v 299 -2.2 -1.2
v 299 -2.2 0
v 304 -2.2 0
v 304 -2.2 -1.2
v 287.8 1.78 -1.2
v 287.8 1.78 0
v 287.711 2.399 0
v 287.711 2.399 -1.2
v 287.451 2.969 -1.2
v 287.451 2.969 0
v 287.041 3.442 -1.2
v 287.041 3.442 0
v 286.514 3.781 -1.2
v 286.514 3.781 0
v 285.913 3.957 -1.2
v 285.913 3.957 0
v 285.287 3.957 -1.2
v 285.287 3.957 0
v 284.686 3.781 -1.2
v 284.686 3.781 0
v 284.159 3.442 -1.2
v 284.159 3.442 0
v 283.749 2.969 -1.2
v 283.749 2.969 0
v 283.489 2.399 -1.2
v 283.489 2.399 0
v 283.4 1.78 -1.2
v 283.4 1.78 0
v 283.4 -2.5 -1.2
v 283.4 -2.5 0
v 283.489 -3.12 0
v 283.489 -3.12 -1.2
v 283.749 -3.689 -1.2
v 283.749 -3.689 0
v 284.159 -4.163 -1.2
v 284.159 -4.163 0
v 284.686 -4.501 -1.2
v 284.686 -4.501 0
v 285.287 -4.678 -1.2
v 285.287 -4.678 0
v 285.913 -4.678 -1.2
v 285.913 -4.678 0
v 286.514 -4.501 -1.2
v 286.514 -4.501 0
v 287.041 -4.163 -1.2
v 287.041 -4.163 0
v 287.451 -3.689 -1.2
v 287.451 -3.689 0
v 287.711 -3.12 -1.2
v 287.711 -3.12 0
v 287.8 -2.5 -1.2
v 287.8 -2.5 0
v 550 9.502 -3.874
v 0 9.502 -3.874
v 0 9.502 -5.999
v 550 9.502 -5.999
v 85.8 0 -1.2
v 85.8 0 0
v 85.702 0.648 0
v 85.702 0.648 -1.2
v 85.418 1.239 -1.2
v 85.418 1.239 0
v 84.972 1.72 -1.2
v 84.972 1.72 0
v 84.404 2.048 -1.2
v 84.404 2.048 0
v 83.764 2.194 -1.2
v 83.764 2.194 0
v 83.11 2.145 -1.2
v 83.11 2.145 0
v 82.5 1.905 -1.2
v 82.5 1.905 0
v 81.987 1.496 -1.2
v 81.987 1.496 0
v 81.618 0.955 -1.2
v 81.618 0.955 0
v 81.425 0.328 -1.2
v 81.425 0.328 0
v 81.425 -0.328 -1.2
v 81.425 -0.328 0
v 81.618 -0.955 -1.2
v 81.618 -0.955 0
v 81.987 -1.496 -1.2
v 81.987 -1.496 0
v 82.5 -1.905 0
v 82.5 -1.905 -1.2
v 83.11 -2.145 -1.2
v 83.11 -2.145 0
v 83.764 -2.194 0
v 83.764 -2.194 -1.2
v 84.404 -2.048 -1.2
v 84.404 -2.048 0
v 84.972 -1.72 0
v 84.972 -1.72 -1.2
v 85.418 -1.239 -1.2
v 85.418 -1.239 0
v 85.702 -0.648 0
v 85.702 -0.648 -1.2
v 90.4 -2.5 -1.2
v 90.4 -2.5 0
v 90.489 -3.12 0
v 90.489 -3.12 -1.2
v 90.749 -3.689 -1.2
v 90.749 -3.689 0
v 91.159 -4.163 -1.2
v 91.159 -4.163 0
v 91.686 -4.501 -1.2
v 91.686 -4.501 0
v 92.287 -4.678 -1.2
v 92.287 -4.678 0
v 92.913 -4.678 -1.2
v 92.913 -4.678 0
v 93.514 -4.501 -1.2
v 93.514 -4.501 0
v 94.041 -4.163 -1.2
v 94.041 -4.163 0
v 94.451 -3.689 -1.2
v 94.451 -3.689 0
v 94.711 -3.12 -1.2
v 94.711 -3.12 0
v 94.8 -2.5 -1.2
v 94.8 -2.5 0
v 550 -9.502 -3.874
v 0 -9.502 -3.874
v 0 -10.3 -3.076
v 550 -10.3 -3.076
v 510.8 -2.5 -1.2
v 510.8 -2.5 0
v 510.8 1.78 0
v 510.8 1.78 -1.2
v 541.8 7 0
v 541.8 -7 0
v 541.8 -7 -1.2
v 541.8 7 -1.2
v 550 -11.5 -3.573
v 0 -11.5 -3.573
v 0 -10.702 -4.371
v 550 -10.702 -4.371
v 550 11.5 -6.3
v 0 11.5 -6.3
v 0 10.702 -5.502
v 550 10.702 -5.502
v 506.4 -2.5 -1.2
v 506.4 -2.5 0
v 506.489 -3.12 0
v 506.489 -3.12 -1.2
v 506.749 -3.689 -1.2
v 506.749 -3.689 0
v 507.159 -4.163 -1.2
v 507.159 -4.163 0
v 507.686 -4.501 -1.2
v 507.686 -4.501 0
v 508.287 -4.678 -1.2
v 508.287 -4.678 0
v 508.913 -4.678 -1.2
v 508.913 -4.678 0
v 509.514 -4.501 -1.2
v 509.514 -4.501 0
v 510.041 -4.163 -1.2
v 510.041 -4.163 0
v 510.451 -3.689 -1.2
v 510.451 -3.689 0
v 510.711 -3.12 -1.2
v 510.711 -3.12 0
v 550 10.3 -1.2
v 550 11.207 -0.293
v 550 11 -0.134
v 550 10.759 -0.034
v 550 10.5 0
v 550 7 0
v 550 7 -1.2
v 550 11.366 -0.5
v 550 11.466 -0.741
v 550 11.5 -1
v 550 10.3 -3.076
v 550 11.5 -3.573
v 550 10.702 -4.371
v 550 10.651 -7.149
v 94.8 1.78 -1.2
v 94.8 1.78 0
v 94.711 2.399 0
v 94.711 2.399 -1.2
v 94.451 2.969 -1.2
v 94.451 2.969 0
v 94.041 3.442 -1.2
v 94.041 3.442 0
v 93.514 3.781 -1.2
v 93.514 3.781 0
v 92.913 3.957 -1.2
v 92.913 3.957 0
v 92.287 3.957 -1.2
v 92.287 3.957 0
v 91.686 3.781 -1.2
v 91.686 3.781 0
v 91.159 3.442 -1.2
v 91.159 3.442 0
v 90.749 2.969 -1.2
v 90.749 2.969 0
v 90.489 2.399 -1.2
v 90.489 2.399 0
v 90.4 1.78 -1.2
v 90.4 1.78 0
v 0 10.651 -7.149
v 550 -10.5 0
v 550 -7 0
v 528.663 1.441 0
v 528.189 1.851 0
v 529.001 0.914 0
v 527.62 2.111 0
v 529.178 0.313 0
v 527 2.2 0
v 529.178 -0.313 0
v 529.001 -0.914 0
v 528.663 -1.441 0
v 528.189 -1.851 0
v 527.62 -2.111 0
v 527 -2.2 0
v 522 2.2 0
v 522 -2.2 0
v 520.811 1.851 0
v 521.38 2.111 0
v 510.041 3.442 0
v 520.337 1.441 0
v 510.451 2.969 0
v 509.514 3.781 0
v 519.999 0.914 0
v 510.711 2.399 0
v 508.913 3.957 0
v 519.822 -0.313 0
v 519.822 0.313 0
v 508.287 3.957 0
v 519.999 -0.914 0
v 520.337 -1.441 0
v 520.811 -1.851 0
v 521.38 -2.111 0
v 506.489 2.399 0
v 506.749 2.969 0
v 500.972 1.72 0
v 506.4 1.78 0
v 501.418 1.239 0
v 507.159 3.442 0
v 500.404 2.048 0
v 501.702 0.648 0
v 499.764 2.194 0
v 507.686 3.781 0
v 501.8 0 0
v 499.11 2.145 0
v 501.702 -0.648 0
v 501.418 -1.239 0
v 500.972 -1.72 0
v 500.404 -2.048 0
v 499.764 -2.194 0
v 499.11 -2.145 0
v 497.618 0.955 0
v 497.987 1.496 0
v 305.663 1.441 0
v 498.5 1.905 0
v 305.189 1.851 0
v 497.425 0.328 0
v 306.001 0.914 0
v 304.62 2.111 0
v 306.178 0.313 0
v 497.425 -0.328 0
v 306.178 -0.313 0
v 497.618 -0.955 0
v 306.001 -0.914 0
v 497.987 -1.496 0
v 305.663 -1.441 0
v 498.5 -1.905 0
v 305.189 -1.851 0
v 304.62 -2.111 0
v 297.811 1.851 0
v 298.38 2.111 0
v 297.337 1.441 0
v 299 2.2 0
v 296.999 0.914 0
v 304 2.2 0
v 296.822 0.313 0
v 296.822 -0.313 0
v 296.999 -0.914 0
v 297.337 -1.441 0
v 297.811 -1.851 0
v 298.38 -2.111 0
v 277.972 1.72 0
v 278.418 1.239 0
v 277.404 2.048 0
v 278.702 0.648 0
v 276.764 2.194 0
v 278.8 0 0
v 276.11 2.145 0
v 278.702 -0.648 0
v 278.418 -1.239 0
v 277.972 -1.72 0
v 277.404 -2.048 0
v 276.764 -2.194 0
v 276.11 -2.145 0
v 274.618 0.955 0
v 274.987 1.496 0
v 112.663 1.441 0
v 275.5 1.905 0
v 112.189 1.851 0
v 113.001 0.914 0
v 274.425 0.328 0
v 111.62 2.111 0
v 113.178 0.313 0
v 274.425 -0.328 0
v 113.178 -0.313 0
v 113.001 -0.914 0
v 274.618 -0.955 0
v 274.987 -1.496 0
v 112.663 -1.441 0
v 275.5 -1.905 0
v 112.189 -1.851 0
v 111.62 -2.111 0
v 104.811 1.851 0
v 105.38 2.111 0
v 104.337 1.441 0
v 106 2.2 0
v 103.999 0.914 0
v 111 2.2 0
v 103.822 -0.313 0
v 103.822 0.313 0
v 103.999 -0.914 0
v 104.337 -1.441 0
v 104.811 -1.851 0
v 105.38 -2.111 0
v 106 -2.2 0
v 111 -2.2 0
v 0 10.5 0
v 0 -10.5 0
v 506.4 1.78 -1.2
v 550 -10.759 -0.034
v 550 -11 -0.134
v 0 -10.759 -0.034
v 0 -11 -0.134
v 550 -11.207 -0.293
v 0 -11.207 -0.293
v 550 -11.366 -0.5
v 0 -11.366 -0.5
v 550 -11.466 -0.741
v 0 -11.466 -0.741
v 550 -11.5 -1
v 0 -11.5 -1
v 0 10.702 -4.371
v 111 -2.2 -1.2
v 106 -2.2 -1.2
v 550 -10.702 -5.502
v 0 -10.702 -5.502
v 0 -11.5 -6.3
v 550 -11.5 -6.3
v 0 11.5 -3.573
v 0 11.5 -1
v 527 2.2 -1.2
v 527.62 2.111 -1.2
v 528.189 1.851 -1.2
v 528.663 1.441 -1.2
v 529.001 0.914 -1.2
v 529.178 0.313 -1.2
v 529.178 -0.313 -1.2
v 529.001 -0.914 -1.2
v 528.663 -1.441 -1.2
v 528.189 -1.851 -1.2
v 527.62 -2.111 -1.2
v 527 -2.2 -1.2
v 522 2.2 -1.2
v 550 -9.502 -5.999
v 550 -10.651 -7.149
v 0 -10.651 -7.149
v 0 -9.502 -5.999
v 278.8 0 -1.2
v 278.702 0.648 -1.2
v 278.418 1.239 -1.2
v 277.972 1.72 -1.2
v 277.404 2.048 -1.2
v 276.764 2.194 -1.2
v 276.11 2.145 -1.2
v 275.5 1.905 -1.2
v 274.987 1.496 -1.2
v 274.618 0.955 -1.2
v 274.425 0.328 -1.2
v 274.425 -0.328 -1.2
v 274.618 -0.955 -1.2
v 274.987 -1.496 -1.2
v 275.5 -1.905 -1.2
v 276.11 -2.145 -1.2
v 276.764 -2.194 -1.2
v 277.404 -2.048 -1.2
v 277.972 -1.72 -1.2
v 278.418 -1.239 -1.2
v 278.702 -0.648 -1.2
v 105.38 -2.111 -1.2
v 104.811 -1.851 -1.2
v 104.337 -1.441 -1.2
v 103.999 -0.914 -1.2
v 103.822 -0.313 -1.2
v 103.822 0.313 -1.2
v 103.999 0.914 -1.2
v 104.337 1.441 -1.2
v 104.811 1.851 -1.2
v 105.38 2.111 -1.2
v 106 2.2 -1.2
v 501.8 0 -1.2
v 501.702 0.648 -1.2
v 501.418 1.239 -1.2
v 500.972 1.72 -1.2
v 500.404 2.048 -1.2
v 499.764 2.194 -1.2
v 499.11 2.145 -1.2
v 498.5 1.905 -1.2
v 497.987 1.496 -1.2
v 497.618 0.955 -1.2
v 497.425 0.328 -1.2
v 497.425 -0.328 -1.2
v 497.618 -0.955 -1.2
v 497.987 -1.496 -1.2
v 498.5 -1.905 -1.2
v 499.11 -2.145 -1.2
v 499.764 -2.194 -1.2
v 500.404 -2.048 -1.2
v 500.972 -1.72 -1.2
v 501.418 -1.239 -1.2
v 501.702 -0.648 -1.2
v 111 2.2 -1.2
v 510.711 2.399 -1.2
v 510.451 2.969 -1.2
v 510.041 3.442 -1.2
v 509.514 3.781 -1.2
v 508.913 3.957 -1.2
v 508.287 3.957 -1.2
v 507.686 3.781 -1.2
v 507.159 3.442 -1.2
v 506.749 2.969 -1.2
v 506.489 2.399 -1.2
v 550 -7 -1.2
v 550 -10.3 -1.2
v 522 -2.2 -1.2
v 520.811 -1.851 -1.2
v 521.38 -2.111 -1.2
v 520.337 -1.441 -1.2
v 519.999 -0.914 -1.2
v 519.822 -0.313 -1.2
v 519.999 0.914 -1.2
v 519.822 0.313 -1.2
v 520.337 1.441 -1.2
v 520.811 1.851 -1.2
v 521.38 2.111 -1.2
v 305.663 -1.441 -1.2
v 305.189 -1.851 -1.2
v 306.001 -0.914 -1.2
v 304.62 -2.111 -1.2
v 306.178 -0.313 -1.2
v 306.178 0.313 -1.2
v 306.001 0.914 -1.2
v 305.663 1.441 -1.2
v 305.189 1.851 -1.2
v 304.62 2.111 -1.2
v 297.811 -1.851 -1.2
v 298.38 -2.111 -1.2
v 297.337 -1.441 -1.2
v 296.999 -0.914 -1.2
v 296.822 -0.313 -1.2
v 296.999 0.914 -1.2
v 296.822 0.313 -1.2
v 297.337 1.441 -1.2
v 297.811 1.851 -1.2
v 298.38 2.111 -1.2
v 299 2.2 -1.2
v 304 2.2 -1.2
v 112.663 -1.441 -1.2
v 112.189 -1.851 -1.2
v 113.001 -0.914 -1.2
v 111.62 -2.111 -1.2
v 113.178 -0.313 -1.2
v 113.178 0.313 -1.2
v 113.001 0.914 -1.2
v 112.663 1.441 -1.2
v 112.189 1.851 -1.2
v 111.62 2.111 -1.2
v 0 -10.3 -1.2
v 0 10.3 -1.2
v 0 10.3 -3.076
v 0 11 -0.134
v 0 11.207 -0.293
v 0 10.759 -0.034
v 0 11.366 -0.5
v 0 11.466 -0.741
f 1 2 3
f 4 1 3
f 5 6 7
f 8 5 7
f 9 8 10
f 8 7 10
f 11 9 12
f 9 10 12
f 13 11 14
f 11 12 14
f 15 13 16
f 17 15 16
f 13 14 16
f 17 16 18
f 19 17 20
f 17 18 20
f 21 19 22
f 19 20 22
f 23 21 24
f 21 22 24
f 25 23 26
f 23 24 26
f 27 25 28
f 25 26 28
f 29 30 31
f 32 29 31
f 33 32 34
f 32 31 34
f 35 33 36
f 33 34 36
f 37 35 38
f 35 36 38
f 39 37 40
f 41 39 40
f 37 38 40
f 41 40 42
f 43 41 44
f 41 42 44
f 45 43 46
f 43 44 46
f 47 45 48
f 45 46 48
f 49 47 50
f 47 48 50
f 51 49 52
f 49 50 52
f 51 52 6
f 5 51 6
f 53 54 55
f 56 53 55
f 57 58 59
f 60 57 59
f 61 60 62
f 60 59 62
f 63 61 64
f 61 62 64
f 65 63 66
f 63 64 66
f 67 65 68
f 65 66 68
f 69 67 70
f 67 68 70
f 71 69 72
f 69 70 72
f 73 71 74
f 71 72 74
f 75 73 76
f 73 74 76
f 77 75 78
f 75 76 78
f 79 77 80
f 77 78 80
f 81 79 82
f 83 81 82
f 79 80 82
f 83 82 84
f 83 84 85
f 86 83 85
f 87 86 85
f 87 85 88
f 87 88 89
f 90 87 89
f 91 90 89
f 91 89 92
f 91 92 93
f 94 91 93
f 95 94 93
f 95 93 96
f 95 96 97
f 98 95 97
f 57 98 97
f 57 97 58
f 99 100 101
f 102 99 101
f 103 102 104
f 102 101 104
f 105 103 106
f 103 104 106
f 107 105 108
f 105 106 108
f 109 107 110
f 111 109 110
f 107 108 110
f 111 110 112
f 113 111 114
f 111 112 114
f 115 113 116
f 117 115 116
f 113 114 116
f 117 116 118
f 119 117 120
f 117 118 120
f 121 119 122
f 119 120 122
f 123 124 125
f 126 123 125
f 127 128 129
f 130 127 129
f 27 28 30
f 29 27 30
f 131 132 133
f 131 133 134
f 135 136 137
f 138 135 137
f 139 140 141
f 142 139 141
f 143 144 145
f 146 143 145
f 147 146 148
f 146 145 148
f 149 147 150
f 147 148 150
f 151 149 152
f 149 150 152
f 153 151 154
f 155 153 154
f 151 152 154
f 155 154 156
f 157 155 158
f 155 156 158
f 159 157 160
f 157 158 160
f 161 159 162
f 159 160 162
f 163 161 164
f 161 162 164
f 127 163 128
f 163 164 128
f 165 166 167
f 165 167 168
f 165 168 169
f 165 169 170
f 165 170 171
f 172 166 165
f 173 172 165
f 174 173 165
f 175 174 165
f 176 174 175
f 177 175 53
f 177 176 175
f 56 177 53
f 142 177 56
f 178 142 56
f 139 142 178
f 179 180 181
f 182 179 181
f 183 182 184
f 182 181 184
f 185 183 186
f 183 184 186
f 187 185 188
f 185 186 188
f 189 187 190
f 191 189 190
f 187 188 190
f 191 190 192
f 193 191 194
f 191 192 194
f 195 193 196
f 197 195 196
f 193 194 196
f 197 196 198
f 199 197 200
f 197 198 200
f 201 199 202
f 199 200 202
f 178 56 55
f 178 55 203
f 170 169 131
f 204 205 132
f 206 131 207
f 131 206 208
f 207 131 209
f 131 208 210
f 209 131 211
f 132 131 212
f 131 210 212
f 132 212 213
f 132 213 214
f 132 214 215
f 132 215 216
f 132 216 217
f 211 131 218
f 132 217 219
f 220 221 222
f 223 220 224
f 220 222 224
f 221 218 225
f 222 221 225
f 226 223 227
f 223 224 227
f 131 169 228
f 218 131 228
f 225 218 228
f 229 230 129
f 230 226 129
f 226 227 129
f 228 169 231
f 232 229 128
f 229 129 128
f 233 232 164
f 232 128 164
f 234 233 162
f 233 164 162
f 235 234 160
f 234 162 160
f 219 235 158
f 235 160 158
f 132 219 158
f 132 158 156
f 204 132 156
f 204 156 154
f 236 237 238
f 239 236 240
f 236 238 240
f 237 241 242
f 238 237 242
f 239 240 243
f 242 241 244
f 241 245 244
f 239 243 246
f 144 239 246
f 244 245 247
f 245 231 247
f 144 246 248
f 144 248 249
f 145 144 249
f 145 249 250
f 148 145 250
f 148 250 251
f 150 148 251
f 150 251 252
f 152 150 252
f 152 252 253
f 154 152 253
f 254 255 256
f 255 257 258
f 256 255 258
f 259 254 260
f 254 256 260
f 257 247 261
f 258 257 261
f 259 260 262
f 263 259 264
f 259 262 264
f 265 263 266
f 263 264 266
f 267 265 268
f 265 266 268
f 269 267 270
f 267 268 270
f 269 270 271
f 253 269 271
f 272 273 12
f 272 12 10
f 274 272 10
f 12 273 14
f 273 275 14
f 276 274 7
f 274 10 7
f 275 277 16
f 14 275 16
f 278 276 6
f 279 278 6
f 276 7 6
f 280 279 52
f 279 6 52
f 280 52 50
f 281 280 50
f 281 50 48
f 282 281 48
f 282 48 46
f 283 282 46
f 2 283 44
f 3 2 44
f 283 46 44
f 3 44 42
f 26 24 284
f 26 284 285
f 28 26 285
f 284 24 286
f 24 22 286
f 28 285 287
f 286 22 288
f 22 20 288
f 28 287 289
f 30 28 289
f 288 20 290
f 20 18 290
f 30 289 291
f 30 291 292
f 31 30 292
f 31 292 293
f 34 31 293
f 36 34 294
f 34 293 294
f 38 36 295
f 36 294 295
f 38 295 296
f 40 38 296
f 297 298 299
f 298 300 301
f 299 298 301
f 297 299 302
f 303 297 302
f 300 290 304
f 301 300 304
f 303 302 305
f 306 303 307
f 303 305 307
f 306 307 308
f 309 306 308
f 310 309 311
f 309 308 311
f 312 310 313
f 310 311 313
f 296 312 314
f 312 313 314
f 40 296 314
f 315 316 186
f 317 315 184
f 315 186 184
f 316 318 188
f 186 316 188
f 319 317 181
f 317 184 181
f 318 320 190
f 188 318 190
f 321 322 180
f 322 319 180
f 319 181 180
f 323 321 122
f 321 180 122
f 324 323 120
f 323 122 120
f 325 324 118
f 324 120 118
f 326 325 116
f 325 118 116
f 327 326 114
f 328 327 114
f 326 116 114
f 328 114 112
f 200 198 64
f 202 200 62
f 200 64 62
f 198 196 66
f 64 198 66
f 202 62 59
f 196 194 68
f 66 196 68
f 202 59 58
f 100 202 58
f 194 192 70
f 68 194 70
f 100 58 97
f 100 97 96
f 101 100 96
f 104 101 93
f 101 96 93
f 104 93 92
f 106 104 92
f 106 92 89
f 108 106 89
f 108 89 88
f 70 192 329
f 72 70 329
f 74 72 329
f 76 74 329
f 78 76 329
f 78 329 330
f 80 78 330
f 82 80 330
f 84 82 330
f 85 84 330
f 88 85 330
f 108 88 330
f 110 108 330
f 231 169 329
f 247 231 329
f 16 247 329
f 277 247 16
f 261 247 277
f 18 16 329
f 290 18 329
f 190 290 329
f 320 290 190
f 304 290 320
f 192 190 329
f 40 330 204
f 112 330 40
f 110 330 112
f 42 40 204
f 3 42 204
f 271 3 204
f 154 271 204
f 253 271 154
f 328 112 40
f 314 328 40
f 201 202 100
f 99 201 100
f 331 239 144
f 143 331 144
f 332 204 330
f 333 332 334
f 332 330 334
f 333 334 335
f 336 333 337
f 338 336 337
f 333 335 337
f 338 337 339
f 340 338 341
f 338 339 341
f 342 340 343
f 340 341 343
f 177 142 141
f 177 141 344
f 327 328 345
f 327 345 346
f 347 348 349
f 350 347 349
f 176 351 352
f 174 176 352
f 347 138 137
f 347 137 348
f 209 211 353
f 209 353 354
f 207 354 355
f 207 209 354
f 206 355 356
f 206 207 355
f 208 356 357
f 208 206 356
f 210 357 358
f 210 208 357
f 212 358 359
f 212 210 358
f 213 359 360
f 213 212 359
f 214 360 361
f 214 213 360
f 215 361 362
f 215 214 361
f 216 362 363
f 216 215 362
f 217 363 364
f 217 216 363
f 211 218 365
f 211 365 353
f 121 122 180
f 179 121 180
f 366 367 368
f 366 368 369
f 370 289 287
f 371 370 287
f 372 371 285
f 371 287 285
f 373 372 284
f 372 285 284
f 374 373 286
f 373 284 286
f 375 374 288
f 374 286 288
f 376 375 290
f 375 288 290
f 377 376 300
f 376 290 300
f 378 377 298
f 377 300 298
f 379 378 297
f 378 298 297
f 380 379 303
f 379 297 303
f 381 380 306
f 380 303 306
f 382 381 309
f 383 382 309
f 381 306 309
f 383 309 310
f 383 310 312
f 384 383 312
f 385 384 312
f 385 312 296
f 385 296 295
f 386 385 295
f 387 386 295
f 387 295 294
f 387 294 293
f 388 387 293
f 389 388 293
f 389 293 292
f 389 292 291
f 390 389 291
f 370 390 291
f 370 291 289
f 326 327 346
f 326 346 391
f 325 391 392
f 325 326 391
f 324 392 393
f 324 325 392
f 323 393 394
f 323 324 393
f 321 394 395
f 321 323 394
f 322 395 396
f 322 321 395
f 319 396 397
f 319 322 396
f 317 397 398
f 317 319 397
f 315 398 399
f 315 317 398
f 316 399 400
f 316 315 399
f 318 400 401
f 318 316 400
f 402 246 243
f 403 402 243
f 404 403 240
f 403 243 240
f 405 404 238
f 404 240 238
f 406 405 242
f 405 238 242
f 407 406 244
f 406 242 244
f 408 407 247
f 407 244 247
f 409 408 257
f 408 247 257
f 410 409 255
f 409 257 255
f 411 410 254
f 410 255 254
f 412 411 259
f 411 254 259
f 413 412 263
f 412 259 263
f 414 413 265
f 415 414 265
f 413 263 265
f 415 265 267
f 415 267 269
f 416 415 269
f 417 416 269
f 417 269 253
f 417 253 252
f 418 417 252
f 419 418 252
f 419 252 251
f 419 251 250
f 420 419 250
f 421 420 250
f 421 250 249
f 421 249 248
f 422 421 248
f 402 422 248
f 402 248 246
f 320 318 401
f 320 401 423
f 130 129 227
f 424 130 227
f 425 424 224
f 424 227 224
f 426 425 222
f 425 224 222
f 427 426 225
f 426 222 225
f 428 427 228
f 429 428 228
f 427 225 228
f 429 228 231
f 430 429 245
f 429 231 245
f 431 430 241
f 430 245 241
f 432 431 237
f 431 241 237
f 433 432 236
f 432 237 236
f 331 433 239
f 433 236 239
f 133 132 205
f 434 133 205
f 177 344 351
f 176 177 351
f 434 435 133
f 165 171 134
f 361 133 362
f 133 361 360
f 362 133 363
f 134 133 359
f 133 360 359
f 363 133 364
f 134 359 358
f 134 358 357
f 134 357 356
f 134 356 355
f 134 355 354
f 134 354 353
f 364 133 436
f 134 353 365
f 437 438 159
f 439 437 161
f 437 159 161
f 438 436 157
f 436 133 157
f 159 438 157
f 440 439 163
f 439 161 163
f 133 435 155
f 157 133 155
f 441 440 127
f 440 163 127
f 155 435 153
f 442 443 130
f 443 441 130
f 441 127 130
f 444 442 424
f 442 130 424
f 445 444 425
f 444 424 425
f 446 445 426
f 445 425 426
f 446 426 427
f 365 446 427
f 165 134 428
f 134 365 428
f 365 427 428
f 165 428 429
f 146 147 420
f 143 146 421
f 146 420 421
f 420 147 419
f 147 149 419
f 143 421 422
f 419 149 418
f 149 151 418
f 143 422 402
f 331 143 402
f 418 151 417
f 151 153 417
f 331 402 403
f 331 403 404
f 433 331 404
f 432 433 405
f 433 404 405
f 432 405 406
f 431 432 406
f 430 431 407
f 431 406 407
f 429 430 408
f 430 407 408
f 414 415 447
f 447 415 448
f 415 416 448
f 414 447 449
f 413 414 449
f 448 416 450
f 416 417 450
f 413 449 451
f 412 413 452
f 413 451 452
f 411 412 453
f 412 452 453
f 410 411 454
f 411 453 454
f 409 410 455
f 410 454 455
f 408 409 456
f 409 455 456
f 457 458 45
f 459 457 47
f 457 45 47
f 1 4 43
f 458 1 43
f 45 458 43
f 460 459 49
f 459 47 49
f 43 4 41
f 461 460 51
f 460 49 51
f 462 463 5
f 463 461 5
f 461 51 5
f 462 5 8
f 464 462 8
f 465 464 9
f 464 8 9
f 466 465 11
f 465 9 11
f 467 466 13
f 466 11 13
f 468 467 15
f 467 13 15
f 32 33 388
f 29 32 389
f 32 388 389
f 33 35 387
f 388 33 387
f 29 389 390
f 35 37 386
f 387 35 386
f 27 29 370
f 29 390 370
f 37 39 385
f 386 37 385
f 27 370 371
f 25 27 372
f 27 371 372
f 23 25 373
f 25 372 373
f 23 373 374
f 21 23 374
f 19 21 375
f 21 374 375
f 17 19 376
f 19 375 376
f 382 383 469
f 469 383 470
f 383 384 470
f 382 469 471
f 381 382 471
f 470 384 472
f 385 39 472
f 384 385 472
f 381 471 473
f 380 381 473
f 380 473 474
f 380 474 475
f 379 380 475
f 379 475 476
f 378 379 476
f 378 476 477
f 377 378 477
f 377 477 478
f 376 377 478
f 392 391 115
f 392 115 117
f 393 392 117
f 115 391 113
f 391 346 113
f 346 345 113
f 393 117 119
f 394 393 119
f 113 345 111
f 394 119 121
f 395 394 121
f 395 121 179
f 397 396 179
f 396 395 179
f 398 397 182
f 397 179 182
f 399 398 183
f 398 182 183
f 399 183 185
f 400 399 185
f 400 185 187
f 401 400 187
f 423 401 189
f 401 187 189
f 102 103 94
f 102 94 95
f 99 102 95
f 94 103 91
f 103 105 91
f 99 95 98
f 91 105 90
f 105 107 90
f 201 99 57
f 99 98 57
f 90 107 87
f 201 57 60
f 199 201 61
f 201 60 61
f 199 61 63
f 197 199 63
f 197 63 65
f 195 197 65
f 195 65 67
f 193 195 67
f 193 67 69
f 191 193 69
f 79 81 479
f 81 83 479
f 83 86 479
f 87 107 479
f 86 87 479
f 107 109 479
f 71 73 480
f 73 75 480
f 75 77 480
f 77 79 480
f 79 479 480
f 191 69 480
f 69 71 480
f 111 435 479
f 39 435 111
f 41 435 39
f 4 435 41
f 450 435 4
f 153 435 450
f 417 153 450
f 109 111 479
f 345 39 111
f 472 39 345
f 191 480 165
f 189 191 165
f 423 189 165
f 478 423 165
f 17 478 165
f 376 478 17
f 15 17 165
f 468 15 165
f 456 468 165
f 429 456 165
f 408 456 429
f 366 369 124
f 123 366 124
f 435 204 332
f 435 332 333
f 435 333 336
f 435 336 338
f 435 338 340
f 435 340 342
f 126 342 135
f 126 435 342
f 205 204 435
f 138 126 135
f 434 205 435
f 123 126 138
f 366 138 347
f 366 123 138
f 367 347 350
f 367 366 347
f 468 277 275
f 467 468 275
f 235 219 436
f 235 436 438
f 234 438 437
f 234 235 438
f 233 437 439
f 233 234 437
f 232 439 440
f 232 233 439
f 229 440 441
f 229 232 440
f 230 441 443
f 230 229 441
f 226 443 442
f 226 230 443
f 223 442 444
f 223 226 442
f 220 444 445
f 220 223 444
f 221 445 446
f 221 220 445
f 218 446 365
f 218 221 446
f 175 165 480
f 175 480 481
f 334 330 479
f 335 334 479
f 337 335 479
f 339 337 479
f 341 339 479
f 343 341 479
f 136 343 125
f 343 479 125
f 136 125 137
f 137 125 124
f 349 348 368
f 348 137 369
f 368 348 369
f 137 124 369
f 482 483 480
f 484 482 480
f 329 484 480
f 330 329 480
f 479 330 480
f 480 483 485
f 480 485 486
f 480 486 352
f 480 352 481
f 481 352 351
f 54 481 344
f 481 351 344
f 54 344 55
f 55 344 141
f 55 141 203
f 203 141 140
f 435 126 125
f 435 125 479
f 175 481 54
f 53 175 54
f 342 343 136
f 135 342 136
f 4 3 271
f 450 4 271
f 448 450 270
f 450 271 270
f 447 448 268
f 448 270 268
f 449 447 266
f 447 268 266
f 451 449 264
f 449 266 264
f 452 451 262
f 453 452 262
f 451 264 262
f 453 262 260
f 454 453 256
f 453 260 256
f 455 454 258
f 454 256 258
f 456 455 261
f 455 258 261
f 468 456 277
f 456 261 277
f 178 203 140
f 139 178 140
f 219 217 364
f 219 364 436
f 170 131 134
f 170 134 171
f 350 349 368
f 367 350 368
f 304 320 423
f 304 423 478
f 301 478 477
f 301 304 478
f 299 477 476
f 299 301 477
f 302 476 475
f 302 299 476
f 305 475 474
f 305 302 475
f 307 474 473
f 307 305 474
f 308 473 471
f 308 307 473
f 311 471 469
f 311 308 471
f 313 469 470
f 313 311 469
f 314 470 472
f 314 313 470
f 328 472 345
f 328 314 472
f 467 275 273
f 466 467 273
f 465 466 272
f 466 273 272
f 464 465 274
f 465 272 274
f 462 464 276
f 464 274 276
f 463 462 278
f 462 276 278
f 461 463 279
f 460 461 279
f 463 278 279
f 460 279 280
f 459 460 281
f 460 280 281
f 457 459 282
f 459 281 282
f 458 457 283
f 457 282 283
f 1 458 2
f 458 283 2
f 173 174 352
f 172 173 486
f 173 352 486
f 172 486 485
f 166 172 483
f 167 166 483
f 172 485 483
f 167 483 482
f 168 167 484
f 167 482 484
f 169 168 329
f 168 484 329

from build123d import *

# Parameters (mm, degrees)
EXTRUDE_3_DEPTH     = 550
SKETCH_2_R          = 2.2
SKETCH_2_W          = 8.2
SKETCH_2_H          = 14
CUT_EXTRUDE_1_DEPTH = 8.148528137


with BuildPart() as part:
    # Эскиз1 → Вытянуть-Тонкостенный3 (new body)
    with BuildSketch(Plane(origin=(0, 0, 0), x_dir=(0, 0, -1), z_dir=(1, 0, 0))):
        with BuildLine():
            Line((6.3, 11.5), (5.501920783, 10.701920783))
            Line((5.501920783, 10.701920783), (4.371381229, 10.701920783))
            Line((4.371381229, 10.701920783), (3.573302011, 11.5))
            Line((3.573302011, 11.5), (1, 11.5))
            ThreePointArc((1, 11.5), (0.292893219, 11.207106781), (0, 10.5))
            Line((0, 10.5), (0, -10.5))
            ThreePointArc((0, -10.5), (0.292893219, -11.207106781), (1, -11.5))
            Line((1, -11.5), (3.573302011, -11.5))
            Line((3.573302011, -11.5), (4.371381229, -10.701920783))
            Line((4.371381229, -10.701920783), (5.501920783, -10.701920783))
            Line((5.501920783, -10.701920783), (6.3, -11.5))
            Line((6.3, -11.5), (7.148528137, -10.651471863))
            Line((7.148528137, -10.651471863), (5.998977057, -9.501920783))
            Line((5.998977057, -9.501920783), (3.874324954, -9.501920783))
            Line((3.874324954, -9.501920783), (3.076245737, -10.3))
            Line((3.076245737, -10.3), (1.2, -10.3))
            Line((1.2, -10.3), (1.2, 10.3))
            Line((1.2, 10.3), (3.076245737, 10.3))
            Line((3.076245737, 10.3), (3.874324954, 9.501920783))
            Line((3.874324954, 9.501920783), (5.998977057, 9.501920783))
            Line((5.998977057, 9.501920783), (7.148528137, 10.651471863))
            Line((7.148528137, 10.651471863), (6.3, 11.5))
        make_face()
    extrude(amount=EXTRUDE_3_DEPTH)

    # Эскиз2 → Вырез-Вытянуть1 (cut, through all)
    with BuildSketch(Plane.XY):
        with Locations((499.6, 0)):
            Circle(SKETCH_2_R)
        with Locations((276.6, 0)):
            Circle(SKETCH_2_R)
        with Locations((83.6, 0)):
            Circle(SKETCH_2_R)
        with Locations((545.9, 0)):
            Rectangle(SKETCH_2_W, SKETCH_2_H)
        with BuildLine():
            Line((522, 2.2), (527, 2.2))
            ThreePointArc((527, 2.2), (529.2, 0), (527, -2.2))
            Line((527, -2.2), (522, -2.2))
            ThreePointArc((522, -2.2), (519.8, 0), (522, 2.2))
        make_face()
        with BuildLine():
            Line((506.4, 1.779598361), (506.4, -2.5))
            ThreePointArc((506.4, -2.5), (508.6, -4.7), (510.8, -2.5))
            Line((510.8, -2.5), (510.8, 1.779598361))
            ThreePointArc((510.8, 1.779598361), (508.6, 3.979598361), (506.4, 1.779598361))
        make_face()
        with BuildLine():
            Line((283.4, 1.779598361), (283.4, -2.5))
            ThreePointArc((283.4, -2.5), (285.6, -4.7), (287.8, -2.5))
            Line((287.8, -2.5), (287.8, 1.779598361))
            ThreePointArc((287.8, 1.779598361), (285.6, 3.979598361), (283.4, 1.779598361))
        make_face()
        with BuildLine():
            Line((299, -2.2), (304, -2.2))
            ThreePointArc((304, -2.2), (306.2, 0), (304, 2.2))
            Line((304, 2.2), (299, 2.2))
            ThreePointArc((299, 2.2), (296.8, 0), (299, -2.2))
        make_face()
        with BuildLine():
            Line((94.8, -2.5), (94.8, 1.779598361))
            ThreePointArc((94.8, 1.779598361), (92.6, 3.979598361), (90.4, 1.779598361))
            Line((90.4, 1.779598361), (90.4, -2.5))
            ThreePointArc((90.4, -2.5), (92.6, -4.7), (94.8, -2.5))
        make_face()
        with BuildLine():
            Line((106, 2.2), (111, 2.2))
            ThreePointArc((111, 2.2), (113.2, 0), (111, -2.2))
            Line((111, -2.2), (106, -2.2))
            ThreePointArc((106, -2.2), (103.8, 0), (106, 2.2))
        make_face()
    extrude(amount=-CUT_EXTRUDE_1_DEPTH, mode=Mode.SUBTRACT)


solid = part.part
